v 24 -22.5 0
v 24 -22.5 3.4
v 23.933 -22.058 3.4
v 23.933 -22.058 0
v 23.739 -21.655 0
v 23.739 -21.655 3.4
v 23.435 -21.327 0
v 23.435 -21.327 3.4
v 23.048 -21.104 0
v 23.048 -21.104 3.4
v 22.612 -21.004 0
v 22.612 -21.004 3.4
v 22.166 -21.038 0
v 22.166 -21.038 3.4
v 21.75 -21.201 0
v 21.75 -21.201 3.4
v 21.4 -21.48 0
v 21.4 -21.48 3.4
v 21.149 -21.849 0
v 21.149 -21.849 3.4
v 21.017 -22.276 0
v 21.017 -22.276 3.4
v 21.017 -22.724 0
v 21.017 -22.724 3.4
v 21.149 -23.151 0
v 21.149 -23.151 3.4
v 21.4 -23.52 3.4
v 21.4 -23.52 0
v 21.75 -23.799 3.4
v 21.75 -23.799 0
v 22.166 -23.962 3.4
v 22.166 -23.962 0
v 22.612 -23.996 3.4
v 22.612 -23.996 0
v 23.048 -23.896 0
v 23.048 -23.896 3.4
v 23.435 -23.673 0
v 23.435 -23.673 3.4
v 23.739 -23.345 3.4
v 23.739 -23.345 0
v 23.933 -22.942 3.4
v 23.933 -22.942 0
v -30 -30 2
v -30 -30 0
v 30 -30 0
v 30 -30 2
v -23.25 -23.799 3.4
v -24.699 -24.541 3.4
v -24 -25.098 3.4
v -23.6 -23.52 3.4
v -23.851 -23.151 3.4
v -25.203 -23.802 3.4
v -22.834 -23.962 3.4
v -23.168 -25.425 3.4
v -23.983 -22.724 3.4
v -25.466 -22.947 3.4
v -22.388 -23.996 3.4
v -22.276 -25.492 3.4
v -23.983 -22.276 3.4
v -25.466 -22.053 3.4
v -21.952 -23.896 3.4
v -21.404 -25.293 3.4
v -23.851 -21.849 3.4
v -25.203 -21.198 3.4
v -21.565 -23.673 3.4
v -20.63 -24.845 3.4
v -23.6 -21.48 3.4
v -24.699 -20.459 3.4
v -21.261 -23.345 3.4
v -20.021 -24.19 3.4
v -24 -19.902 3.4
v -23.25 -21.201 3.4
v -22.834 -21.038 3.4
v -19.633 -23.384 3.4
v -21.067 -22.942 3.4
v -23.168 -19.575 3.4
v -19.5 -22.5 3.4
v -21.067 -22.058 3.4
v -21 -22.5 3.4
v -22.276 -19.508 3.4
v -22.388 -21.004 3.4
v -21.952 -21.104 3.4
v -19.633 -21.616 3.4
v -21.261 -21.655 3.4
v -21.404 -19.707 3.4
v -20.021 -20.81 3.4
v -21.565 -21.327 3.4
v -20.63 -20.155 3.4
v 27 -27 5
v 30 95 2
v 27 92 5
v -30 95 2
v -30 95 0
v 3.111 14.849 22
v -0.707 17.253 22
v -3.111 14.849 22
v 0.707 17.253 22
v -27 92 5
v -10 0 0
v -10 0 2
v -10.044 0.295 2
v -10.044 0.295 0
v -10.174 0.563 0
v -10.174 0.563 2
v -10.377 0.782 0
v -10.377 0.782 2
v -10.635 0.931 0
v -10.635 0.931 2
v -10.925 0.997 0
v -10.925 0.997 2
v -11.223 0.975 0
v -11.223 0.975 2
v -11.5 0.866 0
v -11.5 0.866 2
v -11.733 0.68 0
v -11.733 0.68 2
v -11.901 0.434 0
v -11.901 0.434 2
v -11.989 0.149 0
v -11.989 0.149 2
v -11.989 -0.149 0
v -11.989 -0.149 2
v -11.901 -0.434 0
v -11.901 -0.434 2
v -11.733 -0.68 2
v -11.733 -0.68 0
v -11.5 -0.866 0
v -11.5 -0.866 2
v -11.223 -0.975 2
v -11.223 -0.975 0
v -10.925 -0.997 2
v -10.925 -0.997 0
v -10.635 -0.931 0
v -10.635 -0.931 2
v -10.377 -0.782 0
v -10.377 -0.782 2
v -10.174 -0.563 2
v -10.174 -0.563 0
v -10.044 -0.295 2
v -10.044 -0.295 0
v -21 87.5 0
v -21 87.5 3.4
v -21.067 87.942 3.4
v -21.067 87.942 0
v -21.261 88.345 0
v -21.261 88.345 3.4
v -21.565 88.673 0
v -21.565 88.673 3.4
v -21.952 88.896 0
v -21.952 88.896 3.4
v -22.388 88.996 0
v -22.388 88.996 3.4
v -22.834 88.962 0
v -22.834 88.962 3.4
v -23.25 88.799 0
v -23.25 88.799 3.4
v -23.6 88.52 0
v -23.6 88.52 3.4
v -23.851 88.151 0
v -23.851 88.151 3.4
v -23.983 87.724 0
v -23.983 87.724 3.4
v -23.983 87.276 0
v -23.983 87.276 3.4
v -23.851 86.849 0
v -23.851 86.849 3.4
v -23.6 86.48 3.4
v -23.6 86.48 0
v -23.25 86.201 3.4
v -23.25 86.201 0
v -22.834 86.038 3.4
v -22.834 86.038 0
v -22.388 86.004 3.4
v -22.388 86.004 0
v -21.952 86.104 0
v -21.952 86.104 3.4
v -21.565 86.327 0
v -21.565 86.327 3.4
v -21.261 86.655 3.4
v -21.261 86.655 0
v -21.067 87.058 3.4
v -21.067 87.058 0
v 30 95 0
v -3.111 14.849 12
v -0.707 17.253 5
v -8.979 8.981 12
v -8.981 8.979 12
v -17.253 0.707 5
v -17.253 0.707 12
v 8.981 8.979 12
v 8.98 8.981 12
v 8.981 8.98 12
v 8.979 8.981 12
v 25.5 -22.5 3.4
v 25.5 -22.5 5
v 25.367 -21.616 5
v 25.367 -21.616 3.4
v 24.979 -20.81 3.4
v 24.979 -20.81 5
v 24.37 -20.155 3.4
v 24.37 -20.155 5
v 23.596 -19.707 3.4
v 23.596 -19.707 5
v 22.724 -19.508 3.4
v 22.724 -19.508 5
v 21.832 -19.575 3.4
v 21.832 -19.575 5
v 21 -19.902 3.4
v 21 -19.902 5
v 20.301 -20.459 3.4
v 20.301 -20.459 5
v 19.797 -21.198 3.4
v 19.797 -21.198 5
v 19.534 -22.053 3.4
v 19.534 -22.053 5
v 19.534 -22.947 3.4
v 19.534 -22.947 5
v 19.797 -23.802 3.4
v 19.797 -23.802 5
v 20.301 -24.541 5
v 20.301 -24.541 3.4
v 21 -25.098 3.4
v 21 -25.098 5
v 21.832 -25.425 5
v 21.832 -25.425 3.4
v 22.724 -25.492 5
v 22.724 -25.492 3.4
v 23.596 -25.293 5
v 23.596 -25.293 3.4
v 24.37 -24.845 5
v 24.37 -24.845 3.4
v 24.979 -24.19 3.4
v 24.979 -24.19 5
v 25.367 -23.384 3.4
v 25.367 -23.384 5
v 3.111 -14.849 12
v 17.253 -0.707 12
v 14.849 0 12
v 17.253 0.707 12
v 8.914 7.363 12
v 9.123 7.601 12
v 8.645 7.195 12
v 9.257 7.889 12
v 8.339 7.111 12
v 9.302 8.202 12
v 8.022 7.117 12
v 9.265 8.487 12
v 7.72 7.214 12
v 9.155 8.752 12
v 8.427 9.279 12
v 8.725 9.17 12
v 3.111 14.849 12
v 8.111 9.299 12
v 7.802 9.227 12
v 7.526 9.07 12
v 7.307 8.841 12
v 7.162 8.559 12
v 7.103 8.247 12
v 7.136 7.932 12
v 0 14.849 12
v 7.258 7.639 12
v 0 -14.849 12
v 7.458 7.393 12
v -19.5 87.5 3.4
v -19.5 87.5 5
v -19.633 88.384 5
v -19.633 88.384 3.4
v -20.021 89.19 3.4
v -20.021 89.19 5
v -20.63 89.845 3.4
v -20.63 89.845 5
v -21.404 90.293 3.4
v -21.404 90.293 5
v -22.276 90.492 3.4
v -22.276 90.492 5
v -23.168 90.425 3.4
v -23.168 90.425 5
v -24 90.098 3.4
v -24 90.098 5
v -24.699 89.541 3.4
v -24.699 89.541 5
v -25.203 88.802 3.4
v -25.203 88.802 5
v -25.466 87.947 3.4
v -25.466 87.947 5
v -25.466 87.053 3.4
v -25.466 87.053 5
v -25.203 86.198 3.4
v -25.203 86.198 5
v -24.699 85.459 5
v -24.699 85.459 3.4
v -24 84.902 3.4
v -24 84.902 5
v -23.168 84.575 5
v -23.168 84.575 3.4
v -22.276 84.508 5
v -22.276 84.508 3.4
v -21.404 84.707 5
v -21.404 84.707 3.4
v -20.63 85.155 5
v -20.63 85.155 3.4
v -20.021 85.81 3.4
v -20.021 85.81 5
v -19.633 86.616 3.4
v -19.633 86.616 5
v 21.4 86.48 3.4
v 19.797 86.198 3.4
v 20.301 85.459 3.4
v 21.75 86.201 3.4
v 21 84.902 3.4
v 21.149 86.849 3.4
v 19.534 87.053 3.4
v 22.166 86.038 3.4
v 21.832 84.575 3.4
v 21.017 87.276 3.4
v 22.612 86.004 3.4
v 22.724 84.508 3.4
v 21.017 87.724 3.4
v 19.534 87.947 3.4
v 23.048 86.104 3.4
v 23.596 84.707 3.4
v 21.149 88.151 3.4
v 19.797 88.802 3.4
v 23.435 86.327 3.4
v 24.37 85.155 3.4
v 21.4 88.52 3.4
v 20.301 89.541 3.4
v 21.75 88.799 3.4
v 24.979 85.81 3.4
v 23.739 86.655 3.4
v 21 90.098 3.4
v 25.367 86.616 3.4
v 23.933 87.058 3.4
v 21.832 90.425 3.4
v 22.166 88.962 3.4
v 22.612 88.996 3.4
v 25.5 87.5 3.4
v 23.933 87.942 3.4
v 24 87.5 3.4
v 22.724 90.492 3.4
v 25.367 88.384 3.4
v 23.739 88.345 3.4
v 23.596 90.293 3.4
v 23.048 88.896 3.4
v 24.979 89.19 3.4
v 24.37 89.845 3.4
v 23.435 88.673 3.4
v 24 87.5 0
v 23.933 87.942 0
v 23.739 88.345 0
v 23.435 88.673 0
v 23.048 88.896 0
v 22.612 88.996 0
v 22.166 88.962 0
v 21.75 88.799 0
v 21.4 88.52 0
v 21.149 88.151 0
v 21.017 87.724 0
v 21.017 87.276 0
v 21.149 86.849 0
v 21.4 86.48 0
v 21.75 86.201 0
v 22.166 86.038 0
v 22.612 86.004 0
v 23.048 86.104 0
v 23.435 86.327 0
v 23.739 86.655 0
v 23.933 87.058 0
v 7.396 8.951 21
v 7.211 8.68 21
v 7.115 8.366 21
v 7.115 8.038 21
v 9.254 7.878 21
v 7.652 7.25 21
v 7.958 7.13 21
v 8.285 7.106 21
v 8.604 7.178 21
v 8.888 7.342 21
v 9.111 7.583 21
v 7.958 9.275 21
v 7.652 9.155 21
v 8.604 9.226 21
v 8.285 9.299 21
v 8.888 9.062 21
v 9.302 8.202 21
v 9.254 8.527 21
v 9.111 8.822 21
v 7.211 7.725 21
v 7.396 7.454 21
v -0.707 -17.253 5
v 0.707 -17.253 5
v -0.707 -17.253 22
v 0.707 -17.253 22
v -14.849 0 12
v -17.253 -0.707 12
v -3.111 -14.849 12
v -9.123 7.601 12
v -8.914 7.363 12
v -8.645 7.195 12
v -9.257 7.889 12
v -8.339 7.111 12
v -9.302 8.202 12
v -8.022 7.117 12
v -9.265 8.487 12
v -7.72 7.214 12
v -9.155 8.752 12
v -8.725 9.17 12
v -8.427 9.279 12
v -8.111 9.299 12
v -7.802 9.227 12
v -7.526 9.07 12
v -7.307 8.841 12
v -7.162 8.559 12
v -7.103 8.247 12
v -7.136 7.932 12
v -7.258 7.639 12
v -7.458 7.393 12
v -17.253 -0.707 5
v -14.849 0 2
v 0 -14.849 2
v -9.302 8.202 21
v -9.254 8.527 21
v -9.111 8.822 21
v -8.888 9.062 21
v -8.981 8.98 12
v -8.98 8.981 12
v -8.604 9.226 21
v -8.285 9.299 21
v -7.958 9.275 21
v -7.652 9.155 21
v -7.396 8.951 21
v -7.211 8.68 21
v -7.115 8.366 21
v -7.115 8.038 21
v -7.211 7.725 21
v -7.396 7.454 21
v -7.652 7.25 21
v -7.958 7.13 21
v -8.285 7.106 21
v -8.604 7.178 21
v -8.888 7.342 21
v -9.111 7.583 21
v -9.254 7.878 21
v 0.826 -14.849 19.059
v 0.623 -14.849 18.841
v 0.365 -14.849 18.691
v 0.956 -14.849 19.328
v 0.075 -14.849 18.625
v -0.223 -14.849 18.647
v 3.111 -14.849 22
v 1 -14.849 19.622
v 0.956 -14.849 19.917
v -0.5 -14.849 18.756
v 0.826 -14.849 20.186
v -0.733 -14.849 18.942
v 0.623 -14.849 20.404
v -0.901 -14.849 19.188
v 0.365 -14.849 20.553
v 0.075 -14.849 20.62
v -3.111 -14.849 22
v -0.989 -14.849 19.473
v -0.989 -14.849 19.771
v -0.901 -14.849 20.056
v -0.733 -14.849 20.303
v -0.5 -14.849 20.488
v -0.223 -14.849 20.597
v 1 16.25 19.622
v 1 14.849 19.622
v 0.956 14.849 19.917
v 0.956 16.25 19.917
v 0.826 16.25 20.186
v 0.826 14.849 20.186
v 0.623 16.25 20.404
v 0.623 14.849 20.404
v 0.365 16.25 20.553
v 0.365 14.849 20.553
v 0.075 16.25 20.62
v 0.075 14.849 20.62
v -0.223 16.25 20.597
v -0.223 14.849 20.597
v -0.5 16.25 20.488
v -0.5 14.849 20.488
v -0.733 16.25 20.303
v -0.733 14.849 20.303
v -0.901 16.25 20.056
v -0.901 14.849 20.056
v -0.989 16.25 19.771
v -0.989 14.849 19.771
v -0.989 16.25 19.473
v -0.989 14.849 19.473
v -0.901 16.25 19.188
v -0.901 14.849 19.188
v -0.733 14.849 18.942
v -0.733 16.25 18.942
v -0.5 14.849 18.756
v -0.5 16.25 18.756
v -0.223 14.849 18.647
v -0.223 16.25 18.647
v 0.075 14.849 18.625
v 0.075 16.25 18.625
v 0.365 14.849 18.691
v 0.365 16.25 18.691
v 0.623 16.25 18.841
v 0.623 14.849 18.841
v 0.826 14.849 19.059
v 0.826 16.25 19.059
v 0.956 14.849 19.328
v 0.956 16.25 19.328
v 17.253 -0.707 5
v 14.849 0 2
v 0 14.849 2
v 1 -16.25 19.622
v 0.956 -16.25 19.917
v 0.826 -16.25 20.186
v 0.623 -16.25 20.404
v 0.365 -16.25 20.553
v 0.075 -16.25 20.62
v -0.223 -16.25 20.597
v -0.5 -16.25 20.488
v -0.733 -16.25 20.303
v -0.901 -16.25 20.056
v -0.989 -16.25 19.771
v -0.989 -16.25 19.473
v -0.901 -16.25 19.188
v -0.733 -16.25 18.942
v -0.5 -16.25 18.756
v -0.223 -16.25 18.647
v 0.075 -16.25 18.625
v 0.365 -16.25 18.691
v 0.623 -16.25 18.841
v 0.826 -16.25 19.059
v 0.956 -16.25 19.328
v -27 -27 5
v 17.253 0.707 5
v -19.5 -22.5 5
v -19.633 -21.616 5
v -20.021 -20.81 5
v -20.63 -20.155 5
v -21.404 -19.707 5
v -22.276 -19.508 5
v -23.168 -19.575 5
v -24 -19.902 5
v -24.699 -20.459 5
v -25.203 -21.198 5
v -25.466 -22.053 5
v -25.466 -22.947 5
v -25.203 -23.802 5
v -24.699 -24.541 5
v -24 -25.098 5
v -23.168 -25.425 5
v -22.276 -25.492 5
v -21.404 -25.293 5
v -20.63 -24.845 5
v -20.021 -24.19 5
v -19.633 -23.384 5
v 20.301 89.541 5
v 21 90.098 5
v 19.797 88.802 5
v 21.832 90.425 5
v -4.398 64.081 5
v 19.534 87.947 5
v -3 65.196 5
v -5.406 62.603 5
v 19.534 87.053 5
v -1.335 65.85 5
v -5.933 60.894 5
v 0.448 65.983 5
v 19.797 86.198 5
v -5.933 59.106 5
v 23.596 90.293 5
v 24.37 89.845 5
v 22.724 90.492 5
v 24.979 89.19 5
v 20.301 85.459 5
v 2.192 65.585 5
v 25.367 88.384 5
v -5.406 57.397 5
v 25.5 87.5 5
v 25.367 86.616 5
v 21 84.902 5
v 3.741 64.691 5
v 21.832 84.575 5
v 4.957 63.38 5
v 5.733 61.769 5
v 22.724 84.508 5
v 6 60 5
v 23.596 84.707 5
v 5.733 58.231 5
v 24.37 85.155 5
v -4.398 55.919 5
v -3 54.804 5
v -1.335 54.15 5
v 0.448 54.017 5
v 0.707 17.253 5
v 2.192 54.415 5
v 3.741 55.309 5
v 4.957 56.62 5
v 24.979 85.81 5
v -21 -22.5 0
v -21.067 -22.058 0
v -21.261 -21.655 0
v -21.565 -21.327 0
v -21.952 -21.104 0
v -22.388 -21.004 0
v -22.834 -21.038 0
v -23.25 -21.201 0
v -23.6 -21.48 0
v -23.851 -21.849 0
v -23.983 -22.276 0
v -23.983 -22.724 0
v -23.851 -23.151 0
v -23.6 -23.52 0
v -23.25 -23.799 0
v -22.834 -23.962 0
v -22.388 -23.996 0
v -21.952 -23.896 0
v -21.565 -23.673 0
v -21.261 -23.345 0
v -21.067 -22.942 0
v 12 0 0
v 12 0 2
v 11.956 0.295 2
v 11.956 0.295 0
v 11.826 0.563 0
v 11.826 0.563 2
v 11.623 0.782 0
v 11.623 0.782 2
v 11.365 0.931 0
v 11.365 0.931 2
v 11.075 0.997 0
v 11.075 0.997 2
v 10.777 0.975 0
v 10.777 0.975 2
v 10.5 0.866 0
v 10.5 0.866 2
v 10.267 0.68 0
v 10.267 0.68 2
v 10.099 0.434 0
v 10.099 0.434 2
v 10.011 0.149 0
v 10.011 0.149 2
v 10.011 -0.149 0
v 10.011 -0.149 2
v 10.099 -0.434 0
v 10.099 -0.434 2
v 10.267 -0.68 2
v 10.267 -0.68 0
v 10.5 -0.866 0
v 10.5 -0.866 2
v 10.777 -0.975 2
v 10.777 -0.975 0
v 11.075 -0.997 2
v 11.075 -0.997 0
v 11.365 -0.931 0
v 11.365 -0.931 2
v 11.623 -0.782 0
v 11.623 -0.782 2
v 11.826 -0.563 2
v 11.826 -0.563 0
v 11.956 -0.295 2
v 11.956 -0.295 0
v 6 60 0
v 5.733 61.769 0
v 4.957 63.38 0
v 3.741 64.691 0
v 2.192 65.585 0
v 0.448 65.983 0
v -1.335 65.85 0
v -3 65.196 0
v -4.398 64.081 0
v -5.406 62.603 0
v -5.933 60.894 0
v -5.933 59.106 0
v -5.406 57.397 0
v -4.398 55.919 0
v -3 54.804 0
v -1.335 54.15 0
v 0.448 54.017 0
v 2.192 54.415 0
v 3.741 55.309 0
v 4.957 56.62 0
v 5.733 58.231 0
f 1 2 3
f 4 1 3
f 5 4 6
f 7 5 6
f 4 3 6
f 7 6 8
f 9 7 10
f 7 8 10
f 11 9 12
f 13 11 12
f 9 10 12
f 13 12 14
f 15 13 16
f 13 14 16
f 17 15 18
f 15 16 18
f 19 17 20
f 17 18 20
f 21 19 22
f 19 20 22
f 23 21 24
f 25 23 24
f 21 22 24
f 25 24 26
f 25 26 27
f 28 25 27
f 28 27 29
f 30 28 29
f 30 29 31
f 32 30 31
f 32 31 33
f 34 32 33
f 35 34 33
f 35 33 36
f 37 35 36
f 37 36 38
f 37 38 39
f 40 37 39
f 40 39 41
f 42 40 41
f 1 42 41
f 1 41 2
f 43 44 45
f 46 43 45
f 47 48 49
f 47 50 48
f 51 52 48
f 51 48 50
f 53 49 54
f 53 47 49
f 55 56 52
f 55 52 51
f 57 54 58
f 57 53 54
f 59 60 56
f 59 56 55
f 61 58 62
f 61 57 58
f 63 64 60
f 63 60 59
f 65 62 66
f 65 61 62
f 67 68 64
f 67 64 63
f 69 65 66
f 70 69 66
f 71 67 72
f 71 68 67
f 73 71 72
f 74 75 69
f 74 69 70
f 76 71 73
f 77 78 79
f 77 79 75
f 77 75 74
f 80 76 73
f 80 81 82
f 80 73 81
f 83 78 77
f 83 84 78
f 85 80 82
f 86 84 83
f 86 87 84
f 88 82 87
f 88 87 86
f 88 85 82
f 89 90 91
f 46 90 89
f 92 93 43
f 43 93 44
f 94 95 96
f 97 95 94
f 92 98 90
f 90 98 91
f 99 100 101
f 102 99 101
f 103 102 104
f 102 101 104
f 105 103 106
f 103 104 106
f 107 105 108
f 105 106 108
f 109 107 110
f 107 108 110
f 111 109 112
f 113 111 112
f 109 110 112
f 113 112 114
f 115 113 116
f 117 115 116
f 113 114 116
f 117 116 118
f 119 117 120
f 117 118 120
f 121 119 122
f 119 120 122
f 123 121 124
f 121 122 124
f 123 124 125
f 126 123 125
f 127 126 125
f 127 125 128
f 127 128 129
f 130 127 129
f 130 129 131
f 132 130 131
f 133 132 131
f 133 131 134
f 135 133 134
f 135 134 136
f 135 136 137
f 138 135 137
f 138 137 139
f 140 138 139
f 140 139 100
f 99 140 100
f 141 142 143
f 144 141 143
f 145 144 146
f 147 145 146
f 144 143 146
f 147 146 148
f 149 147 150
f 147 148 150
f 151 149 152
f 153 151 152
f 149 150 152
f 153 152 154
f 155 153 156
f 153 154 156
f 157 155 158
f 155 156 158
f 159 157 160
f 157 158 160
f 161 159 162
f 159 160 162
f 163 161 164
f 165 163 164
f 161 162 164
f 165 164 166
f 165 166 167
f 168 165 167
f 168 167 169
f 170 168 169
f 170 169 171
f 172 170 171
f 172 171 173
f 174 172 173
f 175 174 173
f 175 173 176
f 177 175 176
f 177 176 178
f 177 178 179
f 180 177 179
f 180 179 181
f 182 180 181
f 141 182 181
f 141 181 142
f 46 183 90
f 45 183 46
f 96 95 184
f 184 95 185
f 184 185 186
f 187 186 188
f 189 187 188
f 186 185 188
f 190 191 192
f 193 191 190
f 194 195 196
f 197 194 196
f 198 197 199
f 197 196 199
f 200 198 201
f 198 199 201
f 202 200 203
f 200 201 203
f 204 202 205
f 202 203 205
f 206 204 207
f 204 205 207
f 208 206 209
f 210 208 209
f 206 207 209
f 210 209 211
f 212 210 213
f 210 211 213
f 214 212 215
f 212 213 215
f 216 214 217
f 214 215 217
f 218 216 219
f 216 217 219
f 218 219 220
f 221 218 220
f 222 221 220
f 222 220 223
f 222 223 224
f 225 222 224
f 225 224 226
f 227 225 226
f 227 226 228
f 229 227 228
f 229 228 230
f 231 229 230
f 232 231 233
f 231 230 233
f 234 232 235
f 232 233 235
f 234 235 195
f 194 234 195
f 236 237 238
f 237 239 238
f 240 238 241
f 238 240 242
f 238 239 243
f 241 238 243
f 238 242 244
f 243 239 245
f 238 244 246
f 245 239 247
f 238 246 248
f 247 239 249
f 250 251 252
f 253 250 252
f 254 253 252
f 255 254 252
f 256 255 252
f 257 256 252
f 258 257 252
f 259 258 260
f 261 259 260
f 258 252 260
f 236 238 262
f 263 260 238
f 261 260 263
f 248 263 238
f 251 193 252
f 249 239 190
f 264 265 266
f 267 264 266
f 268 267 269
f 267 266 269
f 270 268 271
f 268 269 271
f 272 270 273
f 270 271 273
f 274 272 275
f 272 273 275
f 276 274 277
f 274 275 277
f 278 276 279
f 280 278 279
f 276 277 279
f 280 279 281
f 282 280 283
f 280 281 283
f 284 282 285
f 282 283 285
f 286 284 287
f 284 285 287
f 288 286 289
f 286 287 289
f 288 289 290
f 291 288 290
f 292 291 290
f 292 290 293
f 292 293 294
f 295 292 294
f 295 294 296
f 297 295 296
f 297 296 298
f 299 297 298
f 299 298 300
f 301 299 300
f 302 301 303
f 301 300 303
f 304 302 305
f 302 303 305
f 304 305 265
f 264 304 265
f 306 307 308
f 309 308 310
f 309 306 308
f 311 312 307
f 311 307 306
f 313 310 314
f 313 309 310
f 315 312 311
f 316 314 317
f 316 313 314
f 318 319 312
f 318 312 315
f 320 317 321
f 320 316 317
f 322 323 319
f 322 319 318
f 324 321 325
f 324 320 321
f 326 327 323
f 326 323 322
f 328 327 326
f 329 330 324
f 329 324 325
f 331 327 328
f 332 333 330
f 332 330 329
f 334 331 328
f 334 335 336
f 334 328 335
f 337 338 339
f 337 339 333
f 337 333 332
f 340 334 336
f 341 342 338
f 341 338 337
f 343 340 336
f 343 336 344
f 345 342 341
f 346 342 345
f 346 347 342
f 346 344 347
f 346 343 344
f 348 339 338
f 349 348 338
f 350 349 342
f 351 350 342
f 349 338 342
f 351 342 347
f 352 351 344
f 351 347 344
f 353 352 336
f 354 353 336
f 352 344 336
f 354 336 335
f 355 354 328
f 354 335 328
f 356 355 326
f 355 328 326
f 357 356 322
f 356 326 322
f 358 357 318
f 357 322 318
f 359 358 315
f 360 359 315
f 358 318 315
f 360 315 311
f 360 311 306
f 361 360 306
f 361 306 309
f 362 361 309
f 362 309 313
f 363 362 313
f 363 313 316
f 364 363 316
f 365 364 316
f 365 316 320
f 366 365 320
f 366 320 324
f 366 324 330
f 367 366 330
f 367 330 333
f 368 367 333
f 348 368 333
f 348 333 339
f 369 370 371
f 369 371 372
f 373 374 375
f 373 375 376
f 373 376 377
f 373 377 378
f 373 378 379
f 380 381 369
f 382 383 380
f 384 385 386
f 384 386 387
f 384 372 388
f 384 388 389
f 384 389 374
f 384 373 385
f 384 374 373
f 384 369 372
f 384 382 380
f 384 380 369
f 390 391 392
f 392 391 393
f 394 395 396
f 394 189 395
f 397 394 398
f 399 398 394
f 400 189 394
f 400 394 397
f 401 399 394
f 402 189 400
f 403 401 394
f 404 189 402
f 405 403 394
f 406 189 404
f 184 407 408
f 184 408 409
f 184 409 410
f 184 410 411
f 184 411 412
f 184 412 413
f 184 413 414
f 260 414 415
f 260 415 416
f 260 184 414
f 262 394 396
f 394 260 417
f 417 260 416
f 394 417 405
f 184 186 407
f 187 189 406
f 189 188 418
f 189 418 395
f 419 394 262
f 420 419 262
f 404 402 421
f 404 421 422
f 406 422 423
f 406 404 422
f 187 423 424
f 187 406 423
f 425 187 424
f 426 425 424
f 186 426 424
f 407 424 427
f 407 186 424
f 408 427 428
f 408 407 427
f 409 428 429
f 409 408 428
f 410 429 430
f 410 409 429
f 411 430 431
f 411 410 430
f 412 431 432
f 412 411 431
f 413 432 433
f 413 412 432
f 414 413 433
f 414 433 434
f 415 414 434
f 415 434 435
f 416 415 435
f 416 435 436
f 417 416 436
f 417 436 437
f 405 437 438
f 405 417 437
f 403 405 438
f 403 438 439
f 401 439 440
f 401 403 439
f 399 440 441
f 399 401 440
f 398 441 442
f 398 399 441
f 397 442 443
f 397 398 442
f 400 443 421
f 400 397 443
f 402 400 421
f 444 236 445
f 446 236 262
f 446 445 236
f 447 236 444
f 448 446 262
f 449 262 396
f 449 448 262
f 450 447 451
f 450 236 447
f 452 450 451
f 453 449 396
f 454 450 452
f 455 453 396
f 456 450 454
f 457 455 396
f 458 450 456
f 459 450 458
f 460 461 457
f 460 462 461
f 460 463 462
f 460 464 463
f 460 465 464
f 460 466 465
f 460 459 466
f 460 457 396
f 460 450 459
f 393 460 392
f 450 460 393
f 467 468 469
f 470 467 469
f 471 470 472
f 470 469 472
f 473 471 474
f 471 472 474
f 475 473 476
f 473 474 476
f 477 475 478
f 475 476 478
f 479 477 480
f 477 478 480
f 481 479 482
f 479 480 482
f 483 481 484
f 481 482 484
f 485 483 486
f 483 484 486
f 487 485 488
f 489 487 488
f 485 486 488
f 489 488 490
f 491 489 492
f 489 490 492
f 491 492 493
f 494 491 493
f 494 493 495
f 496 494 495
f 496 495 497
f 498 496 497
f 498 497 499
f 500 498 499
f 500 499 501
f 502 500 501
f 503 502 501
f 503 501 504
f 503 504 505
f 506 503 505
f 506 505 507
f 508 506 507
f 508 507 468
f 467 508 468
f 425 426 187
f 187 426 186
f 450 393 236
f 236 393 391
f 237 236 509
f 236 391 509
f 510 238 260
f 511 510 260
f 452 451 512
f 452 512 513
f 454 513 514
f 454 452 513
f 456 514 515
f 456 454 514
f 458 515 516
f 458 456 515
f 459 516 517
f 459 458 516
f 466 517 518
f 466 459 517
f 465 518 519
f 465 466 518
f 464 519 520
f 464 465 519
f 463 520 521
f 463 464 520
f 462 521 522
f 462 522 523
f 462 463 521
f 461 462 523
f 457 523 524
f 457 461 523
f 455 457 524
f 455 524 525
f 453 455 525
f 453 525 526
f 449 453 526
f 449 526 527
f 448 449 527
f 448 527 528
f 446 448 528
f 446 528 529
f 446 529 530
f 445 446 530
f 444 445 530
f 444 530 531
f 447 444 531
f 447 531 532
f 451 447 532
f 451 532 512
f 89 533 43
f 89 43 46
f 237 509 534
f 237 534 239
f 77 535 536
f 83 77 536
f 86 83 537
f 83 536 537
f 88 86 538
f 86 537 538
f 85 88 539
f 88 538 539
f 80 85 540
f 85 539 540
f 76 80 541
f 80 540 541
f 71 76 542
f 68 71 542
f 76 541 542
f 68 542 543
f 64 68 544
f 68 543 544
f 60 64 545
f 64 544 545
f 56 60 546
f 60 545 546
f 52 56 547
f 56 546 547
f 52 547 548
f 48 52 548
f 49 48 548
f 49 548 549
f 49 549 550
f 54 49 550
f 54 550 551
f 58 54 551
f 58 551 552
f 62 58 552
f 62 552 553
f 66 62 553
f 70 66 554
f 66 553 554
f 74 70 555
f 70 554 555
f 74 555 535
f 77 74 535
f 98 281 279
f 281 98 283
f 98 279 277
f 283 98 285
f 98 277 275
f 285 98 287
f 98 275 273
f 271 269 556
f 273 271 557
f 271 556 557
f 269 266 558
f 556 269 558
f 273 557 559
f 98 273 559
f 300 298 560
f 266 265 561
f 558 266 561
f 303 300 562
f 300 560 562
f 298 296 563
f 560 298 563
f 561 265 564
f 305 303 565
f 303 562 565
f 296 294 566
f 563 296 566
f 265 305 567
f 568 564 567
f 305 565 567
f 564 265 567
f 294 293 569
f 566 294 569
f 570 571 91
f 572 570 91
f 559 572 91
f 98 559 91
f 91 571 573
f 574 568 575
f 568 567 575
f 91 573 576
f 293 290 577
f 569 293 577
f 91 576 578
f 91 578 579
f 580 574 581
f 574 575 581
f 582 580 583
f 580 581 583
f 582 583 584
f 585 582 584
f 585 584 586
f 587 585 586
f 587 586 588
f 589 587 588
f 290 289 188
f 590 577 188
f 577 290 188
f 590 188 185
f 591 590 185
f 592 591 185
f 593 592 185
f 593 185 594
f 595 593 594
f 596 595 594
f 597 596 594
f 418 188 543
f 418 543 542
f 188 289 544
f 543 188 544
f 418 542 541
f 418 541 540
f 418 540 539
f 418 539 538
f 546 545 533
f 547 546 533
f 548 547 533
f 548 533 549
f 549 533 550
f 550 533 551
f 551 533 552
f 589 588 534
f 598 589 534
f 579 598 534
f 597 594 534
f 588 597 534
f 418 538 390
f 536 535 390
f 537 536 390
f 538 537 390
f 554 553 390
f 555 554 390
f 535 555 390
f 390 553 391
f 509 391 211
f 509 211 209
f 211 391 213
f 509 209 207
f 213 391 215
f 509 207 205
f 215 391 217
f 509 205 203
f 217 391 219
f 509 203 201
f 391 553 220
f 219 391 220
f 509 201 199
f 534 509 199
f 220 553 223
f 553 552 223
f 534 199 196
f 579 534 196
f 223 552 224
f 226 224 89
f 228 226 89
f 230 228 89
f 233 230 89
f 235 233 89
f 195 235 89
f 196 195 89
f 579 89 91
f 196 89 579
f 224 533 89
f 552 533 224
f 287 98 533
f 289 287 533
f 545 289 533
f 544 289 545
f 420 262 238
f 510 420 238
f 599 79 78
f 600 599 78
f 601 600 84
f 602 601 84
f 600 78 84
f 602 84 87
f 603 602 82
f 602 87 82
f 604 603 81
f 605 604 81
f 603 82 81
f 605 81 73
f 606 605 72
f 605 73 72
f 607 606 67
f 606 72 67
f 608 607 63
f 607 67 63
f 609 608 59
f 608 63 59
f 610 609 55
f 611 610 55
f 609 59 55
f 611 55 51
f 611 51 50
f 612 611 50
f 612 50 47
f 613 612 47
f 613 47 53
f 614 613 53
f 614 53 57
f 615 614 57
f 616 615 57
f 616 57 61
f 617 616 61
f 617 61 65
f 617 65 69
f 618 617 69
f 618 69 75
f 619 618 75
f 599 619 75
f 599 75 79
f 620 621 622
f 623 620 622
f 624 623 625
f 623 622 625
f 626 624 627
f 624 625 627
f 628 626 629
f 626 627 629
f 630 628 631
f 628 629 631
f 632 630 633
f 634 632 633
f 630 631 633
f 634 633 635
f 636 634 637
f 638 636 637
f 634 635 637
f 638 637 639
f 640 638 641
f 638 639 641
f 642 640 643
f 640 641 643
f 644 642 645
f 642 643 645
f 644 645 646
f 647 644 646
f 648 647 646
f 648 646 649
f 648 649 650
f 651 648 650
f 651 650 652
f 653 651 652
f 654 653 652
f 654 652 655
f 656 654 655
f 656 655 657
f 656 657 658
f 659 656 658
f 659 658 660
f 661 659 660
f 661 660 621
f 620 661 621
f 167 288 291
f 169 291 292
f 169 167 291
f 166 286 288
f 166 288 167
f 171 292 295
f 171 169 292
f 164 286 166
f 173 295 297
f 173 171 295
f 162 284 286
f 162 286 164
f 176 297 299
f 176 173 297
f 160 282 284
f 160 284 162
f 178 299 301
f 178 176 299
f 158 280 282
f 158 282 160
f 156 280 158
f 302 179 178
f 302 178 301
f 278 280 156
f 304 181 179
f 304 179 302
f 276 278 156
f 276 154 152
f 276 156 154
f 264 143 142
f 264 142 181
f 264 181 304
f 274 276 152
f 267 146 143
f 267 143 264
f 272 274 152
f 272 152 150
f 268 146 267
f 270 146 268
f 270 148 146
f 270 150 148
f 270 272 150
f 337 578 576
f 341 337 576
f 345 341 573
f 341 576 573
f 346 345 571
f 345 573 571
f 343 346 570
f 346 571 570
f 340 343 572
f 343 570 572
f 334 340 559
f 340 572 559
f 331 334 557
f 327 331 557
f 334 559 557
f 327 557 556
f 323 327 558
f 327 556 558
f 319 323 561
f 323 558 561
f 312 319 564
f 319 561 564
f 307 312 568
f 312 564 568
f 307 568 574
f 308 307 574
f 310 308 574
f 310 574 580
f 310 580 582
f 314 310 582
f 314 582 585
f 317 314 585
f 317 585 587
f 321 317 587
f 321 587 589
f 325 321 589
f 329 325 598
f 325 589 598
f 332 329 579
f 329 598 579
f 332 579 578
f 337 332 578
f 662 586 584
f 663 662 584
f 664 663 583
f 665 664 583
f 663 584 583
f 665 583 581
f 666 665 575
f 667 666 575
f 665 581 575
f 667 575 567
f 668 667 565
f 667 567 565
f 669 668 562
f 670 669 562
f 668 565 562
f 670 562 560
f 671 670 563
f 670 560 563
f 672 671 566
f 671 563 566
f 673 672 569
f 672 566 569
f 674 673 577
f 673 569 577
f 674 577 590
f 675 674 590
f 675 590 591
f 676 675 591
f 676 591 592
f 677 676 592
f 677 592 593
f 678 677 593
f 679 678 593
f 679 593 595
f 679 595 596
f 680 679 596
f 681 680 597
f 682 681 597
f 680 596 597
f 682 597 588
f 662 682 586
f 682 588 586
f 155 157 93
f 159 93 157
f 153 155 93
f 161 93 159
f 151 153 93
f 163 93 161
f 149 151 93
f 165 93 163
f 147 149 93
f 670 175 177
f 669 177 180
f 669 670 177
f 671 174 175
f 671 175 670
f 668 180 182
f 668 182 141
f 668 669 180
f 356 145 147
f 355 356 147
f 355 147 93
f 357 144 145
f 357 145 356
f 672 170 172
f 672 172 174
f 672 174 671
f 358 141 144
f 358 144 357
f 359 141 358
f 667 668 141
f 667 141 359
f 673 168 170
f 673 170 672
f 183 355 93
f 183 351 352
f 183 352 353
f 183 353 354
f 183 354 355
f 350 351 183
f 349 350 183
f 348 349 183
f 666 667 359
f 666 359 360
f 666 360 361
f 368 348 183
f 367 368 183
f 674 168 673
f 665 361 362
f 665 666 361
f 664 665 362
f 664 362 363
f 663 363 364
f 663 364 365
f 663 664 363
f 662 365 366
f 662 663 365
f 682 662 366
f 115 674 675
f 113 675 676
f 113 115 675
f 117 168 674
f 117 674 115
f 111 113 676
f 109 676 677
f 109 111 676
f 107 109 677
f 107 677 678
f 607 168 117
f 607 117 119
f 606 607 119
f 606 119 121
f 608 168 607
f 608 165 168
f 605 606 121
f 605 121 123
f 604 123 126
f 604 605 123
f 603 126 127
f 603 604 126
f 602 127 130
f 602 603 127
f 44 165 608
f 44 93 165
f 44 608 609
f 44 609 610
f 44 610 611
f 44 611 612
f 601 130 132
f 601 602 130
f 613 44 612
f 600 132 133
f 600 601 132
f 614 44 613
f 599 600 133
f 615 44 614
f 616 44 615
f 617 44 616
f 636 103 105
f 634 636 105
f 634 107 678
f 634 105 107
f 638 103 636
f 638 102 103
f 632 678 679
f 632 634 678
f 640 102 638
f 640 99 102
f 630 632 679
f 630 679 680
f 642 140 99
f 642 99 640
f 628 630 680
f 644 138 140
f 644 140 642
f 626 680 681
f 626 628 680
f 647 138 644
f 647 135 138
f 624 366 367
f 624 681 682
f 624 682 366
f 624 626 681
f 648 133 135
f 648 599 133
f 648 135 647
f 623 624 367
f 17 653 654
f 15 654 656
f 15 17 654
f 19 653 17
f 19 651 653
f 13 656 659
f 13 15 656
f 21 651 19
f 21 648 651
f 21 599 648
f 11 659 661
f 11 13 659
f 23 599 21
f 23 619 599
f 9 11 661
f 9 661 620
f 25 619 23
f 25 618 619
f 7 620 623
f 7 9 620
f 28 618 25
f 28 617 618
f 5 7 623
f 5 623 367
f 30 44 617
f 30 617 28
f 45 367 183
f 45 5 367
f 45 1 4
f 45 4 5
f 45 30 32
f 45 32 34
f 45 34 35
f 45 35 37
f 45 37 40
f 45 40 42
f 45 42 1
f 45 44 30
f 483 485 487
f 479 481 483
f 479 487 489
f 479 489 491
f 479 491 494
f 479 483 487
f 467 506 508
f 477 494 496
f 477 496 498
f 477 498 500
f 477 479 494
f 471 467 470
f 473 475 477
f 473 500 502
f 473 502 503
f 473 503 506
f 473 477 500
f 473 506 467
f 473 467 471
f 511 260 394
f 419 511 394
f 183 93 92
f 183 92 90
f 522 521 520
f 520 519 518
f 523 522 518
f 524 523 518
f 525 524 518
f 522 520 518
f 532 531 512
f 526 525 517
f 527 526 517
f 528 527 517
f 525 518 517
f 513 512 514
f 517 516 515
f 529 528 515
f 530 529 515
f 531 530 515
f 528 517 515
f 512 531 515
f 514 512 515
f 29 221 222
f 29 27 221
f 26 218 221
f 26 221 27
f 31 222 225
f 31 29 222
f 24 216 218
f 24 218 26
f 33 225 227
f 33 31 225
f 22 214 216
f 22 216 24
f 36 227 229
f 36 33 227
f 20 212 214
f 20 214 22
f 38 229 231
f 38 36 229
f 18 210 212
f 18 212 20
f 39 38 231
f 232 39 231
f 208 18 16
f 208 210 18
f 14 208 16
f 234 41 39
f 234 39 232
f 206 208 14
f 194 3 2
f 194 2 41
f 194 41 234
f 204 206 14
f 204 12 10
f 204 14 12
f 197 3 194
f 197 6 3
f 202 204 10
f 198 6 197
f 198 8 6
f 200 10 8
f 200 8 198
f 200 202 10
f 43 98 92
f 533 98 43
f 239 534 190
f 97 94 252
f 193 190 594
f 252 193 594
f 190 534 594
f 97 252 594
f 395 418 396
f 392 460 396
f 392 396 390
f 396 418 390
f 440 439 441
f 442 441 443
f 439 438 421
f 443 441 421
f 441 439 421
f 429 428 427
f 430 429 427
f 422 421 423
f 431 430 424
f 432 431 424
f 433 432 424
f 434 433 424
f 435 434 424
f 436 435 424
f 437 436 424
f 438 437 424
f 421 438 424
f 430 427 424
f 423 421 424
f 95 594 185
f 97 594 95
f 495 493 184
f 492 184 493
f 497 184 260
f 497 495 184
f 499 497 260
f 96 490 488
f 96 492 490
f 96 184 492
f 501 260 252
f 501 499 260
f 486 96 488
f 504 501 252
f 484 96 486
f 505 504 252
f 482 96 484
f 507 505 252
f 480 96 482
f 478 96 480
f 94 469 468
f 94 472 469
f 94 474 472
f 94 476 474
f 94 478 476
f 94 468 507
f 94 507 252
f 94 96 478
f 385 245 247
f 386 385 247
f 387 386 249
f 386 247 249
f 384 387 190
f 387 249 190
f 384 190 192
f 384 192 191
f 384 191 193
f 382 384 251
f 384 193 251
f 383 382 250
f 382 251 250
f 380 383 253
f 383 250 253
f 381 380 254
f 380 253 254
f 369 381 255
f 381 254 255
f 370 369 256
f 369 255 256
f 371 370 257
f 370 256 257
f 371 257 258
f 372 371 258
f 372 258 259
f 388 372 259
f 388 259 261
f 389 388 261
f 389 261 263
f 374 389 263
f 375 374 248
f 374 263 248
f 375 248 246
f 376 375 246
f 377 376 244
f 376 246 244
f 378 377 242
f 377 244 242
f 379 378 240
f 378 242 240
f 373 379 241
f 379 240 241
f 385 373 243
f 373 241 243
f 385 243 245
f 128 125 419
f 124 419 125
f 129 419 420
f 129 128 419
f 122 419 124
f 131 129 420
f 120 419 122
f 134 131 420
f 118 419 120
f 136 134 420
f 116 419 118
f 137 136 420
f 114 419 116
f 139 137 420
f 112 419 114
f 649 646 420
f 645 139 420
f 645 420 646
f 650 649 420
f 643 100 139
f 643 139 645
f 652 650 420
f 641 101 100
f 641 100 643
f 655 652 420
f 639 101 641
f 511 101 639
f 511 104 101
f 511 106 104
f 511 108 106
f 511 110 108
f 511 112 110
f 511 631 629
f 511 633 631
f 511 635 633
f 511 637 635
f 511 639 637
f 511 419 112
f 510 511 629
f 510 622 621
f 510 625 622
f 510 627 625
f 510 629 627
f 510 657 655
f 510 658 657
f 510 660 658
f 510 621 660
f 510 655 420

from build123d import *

# Parameters (mm, degrees)
PAD_DEPTH            = 22
POCKET_DEPTH         = 20
POCKET001_DEPTH      = 10
SKETCH003_R          = 1
POCKET002_DEPTH      = 16.25
POCKET002_DEPTH_BACK = -16.25
SKETCH004_R          = 1.1
PAD001_DEPTH         = 9
SKETCH005_R          = 1
POCKET003_DEPTH      = 5
SKETCH006_W          = 60
SKETCH006_H          = 125
PAD002_DEPTH         = 5
CHAMFER_SIZE         = 3
CHAMFER001_SIZE      = 1
SKETCH007_R          = 6
POCKET004_DEPTH      = 5
SKETCH008_R          = 1.5
POCKET005_DEPTH      = 5
SKETCH009_R          = 3
POCKET006_DEPTH      = 1.6


with BuildPart() as part:
    # Sketch → Pad (new body)
    with BuildSketch(Plane.XY):
        Polygon((0, -17.960512), (17.960512, 0), (0, 17.960512), (-17.960512, 0), align=None)
    extrude(amount=PAD_DEPTH)

    # Sketch001 (on Face6 of Pad) → Pocket (cut)
    with BuildSketch(Plane.XY.offset(22)):
        Polygon((0, 14.849242), (-14.849242, 0), (0, -14.849242), (14.849242, 0), align=None)
    extrude(amount=-POCKET_DEPTH, mode=Mode.SUBTRACT)

    # Sketch002 (on Face5 of Pocket) → Pocket001 (cut)
    with BuildSketch(Plane.XY.offset(22)):
        Polygon((-3.11127, 14.849242), (-17.960512, 0), (-3.11127, -14.849242), (0, -14.849242), (-14.849242, 0), (0, 14.849242), align=None)
    pocket001 = extrude(amount=-POCKET001_DEPTH, mode=Mode.SUBTRACT)

    # Mirrored: Pocket001 across YZ
    add(pocket001.mirror(Plane.YZ), mode=Mode.SUBTRACT)

    # Sketch003 → Pocket002 (cut, two sides)
    with BuildSketch(Plane.XZ) as pocket002_sk:
        with Locations((0, 19.622342)):
            Circle(SKETCH003_R)
    extrude(amount=-POCKET002_DEPTH, mode=Mode.SUBTRACT)
    extrude(pocket002_sk.sketch, amount=-POCKET002_DEPTH_BACK, mode=Mode.SUBTRACT)

    # Sketch004 (on Face15 of Pocket002) → Pad001 (join)
    with BuildSketch(Plane.XY.offset(12)):
        with Locations((8.202439, 8.202439)):
            Circle(SKETCH004_R)
    pad001 = extrude(amount=PAD001_DEPTH)

    # Mirrored001: Pad001 across YZ
    add(pad001.mirror(Plane.YZ))

    # Sketch005 (on Face21 of Mirrored001) → Pocket003 (cut)
    with BuildSketch(Plane.XY.offset(2)):
        with Locations((-11, 0)):
            Circle(SKETCH005_R)
        with Locations((11, 0)):
            Circle(SKETCH005_R)
    extrude(amount=-POCKET003_DEPTH, mode=Mode.SUBTRACT)

    # Sketch006 (on Face2 of Pocket003) → Pad002 (join)
    with BuildSketch(Plane(origin=(0, 0, 0), x_dir=(1, 0, 0), z_dir=(0, 0, -1))):
        with Locations((0, -32.5)):
            Rectangle(SKETCH006_W, SKETCH006_H)
        Polygon((0, 17.526509), (-17.526509, 0), (0, -17.526509), (17.526509, 0), align=None, mode=Mode.SUBTRACT)
    extrude(amount=-PAD002_DEPTH)

    # Chamfer
    chamfer_edges = [part.edges().sort_by_distance(p)[0] for p in [
        (30, 32.5, 5),
        (0, 95, 5),
        (-30, 32.5, 5),
        (0, -30, 5),
    ]]
    chamfer(chamfer_edges, length=CHAMFER_SIZE)

    # Chamfer001
    chamfer001_edges = [part.edges().sort_by_distance(p)[0] for p in [
        (17.960512, 0, 8.5),
        (0, 17.960512, 13.5),
        (-17.960512, 0, 8.5),
        (0, -17.960512, 13.5),
    ]]
    chamfer(chamfer001_edges, length=CHAMFER001_SIZE)

    # Sketch007 (on Face1 of Chamfer001) → Pocket004 (cut)
    with BuildSketch(Plane.XY.offset(5)):
        with Locations((0, 60)):
            Circle(SKETCH007_R)
    extrude(amount=-POCKET004_DEPTH, mode=Mode.SUBTRACT)

    # Sketch008 (on Face1 of Pocket004) → Pocket005 (cut)
    with BuildSketch(Plane.XY.offset(5)):
        with Locations((-22.5, 87.5)):
            Circle(SKETCH008_R)
        with Locations((22.5, 87.5)):
            Circle(SKETCH008_R)
        with Locations((22.5, -22.5)):
            Circle(SKETCH008_R)
        with Locations((-22.5, -22.5)):
            Circle(SKETCH008_R)
    extrude(amount=-POCKET005_DEPTH, mode=Mode.SUBTRACT)

    # Sketch009 (on Face1 of Pocket005) → Pocket006 (cut)
    with BuildSketch(Plane.XY.offset(5)):
        with Locations((-22.5, 87.5)):
            Circle(SKETCH009_R)
        with Locations((22.5, 87.5)):
            Circle(SKETCH009_R)
        with Locations((-22.5, -22.5)):
            Circle(SKETCH009_R)
        with Locations((22.5, -22.5)):
            Circle(SKETCH009_R)
    extrude(amount=-POCKET006_DEPTH, mode=Mode.SUBTRACT)


solid = part.part
